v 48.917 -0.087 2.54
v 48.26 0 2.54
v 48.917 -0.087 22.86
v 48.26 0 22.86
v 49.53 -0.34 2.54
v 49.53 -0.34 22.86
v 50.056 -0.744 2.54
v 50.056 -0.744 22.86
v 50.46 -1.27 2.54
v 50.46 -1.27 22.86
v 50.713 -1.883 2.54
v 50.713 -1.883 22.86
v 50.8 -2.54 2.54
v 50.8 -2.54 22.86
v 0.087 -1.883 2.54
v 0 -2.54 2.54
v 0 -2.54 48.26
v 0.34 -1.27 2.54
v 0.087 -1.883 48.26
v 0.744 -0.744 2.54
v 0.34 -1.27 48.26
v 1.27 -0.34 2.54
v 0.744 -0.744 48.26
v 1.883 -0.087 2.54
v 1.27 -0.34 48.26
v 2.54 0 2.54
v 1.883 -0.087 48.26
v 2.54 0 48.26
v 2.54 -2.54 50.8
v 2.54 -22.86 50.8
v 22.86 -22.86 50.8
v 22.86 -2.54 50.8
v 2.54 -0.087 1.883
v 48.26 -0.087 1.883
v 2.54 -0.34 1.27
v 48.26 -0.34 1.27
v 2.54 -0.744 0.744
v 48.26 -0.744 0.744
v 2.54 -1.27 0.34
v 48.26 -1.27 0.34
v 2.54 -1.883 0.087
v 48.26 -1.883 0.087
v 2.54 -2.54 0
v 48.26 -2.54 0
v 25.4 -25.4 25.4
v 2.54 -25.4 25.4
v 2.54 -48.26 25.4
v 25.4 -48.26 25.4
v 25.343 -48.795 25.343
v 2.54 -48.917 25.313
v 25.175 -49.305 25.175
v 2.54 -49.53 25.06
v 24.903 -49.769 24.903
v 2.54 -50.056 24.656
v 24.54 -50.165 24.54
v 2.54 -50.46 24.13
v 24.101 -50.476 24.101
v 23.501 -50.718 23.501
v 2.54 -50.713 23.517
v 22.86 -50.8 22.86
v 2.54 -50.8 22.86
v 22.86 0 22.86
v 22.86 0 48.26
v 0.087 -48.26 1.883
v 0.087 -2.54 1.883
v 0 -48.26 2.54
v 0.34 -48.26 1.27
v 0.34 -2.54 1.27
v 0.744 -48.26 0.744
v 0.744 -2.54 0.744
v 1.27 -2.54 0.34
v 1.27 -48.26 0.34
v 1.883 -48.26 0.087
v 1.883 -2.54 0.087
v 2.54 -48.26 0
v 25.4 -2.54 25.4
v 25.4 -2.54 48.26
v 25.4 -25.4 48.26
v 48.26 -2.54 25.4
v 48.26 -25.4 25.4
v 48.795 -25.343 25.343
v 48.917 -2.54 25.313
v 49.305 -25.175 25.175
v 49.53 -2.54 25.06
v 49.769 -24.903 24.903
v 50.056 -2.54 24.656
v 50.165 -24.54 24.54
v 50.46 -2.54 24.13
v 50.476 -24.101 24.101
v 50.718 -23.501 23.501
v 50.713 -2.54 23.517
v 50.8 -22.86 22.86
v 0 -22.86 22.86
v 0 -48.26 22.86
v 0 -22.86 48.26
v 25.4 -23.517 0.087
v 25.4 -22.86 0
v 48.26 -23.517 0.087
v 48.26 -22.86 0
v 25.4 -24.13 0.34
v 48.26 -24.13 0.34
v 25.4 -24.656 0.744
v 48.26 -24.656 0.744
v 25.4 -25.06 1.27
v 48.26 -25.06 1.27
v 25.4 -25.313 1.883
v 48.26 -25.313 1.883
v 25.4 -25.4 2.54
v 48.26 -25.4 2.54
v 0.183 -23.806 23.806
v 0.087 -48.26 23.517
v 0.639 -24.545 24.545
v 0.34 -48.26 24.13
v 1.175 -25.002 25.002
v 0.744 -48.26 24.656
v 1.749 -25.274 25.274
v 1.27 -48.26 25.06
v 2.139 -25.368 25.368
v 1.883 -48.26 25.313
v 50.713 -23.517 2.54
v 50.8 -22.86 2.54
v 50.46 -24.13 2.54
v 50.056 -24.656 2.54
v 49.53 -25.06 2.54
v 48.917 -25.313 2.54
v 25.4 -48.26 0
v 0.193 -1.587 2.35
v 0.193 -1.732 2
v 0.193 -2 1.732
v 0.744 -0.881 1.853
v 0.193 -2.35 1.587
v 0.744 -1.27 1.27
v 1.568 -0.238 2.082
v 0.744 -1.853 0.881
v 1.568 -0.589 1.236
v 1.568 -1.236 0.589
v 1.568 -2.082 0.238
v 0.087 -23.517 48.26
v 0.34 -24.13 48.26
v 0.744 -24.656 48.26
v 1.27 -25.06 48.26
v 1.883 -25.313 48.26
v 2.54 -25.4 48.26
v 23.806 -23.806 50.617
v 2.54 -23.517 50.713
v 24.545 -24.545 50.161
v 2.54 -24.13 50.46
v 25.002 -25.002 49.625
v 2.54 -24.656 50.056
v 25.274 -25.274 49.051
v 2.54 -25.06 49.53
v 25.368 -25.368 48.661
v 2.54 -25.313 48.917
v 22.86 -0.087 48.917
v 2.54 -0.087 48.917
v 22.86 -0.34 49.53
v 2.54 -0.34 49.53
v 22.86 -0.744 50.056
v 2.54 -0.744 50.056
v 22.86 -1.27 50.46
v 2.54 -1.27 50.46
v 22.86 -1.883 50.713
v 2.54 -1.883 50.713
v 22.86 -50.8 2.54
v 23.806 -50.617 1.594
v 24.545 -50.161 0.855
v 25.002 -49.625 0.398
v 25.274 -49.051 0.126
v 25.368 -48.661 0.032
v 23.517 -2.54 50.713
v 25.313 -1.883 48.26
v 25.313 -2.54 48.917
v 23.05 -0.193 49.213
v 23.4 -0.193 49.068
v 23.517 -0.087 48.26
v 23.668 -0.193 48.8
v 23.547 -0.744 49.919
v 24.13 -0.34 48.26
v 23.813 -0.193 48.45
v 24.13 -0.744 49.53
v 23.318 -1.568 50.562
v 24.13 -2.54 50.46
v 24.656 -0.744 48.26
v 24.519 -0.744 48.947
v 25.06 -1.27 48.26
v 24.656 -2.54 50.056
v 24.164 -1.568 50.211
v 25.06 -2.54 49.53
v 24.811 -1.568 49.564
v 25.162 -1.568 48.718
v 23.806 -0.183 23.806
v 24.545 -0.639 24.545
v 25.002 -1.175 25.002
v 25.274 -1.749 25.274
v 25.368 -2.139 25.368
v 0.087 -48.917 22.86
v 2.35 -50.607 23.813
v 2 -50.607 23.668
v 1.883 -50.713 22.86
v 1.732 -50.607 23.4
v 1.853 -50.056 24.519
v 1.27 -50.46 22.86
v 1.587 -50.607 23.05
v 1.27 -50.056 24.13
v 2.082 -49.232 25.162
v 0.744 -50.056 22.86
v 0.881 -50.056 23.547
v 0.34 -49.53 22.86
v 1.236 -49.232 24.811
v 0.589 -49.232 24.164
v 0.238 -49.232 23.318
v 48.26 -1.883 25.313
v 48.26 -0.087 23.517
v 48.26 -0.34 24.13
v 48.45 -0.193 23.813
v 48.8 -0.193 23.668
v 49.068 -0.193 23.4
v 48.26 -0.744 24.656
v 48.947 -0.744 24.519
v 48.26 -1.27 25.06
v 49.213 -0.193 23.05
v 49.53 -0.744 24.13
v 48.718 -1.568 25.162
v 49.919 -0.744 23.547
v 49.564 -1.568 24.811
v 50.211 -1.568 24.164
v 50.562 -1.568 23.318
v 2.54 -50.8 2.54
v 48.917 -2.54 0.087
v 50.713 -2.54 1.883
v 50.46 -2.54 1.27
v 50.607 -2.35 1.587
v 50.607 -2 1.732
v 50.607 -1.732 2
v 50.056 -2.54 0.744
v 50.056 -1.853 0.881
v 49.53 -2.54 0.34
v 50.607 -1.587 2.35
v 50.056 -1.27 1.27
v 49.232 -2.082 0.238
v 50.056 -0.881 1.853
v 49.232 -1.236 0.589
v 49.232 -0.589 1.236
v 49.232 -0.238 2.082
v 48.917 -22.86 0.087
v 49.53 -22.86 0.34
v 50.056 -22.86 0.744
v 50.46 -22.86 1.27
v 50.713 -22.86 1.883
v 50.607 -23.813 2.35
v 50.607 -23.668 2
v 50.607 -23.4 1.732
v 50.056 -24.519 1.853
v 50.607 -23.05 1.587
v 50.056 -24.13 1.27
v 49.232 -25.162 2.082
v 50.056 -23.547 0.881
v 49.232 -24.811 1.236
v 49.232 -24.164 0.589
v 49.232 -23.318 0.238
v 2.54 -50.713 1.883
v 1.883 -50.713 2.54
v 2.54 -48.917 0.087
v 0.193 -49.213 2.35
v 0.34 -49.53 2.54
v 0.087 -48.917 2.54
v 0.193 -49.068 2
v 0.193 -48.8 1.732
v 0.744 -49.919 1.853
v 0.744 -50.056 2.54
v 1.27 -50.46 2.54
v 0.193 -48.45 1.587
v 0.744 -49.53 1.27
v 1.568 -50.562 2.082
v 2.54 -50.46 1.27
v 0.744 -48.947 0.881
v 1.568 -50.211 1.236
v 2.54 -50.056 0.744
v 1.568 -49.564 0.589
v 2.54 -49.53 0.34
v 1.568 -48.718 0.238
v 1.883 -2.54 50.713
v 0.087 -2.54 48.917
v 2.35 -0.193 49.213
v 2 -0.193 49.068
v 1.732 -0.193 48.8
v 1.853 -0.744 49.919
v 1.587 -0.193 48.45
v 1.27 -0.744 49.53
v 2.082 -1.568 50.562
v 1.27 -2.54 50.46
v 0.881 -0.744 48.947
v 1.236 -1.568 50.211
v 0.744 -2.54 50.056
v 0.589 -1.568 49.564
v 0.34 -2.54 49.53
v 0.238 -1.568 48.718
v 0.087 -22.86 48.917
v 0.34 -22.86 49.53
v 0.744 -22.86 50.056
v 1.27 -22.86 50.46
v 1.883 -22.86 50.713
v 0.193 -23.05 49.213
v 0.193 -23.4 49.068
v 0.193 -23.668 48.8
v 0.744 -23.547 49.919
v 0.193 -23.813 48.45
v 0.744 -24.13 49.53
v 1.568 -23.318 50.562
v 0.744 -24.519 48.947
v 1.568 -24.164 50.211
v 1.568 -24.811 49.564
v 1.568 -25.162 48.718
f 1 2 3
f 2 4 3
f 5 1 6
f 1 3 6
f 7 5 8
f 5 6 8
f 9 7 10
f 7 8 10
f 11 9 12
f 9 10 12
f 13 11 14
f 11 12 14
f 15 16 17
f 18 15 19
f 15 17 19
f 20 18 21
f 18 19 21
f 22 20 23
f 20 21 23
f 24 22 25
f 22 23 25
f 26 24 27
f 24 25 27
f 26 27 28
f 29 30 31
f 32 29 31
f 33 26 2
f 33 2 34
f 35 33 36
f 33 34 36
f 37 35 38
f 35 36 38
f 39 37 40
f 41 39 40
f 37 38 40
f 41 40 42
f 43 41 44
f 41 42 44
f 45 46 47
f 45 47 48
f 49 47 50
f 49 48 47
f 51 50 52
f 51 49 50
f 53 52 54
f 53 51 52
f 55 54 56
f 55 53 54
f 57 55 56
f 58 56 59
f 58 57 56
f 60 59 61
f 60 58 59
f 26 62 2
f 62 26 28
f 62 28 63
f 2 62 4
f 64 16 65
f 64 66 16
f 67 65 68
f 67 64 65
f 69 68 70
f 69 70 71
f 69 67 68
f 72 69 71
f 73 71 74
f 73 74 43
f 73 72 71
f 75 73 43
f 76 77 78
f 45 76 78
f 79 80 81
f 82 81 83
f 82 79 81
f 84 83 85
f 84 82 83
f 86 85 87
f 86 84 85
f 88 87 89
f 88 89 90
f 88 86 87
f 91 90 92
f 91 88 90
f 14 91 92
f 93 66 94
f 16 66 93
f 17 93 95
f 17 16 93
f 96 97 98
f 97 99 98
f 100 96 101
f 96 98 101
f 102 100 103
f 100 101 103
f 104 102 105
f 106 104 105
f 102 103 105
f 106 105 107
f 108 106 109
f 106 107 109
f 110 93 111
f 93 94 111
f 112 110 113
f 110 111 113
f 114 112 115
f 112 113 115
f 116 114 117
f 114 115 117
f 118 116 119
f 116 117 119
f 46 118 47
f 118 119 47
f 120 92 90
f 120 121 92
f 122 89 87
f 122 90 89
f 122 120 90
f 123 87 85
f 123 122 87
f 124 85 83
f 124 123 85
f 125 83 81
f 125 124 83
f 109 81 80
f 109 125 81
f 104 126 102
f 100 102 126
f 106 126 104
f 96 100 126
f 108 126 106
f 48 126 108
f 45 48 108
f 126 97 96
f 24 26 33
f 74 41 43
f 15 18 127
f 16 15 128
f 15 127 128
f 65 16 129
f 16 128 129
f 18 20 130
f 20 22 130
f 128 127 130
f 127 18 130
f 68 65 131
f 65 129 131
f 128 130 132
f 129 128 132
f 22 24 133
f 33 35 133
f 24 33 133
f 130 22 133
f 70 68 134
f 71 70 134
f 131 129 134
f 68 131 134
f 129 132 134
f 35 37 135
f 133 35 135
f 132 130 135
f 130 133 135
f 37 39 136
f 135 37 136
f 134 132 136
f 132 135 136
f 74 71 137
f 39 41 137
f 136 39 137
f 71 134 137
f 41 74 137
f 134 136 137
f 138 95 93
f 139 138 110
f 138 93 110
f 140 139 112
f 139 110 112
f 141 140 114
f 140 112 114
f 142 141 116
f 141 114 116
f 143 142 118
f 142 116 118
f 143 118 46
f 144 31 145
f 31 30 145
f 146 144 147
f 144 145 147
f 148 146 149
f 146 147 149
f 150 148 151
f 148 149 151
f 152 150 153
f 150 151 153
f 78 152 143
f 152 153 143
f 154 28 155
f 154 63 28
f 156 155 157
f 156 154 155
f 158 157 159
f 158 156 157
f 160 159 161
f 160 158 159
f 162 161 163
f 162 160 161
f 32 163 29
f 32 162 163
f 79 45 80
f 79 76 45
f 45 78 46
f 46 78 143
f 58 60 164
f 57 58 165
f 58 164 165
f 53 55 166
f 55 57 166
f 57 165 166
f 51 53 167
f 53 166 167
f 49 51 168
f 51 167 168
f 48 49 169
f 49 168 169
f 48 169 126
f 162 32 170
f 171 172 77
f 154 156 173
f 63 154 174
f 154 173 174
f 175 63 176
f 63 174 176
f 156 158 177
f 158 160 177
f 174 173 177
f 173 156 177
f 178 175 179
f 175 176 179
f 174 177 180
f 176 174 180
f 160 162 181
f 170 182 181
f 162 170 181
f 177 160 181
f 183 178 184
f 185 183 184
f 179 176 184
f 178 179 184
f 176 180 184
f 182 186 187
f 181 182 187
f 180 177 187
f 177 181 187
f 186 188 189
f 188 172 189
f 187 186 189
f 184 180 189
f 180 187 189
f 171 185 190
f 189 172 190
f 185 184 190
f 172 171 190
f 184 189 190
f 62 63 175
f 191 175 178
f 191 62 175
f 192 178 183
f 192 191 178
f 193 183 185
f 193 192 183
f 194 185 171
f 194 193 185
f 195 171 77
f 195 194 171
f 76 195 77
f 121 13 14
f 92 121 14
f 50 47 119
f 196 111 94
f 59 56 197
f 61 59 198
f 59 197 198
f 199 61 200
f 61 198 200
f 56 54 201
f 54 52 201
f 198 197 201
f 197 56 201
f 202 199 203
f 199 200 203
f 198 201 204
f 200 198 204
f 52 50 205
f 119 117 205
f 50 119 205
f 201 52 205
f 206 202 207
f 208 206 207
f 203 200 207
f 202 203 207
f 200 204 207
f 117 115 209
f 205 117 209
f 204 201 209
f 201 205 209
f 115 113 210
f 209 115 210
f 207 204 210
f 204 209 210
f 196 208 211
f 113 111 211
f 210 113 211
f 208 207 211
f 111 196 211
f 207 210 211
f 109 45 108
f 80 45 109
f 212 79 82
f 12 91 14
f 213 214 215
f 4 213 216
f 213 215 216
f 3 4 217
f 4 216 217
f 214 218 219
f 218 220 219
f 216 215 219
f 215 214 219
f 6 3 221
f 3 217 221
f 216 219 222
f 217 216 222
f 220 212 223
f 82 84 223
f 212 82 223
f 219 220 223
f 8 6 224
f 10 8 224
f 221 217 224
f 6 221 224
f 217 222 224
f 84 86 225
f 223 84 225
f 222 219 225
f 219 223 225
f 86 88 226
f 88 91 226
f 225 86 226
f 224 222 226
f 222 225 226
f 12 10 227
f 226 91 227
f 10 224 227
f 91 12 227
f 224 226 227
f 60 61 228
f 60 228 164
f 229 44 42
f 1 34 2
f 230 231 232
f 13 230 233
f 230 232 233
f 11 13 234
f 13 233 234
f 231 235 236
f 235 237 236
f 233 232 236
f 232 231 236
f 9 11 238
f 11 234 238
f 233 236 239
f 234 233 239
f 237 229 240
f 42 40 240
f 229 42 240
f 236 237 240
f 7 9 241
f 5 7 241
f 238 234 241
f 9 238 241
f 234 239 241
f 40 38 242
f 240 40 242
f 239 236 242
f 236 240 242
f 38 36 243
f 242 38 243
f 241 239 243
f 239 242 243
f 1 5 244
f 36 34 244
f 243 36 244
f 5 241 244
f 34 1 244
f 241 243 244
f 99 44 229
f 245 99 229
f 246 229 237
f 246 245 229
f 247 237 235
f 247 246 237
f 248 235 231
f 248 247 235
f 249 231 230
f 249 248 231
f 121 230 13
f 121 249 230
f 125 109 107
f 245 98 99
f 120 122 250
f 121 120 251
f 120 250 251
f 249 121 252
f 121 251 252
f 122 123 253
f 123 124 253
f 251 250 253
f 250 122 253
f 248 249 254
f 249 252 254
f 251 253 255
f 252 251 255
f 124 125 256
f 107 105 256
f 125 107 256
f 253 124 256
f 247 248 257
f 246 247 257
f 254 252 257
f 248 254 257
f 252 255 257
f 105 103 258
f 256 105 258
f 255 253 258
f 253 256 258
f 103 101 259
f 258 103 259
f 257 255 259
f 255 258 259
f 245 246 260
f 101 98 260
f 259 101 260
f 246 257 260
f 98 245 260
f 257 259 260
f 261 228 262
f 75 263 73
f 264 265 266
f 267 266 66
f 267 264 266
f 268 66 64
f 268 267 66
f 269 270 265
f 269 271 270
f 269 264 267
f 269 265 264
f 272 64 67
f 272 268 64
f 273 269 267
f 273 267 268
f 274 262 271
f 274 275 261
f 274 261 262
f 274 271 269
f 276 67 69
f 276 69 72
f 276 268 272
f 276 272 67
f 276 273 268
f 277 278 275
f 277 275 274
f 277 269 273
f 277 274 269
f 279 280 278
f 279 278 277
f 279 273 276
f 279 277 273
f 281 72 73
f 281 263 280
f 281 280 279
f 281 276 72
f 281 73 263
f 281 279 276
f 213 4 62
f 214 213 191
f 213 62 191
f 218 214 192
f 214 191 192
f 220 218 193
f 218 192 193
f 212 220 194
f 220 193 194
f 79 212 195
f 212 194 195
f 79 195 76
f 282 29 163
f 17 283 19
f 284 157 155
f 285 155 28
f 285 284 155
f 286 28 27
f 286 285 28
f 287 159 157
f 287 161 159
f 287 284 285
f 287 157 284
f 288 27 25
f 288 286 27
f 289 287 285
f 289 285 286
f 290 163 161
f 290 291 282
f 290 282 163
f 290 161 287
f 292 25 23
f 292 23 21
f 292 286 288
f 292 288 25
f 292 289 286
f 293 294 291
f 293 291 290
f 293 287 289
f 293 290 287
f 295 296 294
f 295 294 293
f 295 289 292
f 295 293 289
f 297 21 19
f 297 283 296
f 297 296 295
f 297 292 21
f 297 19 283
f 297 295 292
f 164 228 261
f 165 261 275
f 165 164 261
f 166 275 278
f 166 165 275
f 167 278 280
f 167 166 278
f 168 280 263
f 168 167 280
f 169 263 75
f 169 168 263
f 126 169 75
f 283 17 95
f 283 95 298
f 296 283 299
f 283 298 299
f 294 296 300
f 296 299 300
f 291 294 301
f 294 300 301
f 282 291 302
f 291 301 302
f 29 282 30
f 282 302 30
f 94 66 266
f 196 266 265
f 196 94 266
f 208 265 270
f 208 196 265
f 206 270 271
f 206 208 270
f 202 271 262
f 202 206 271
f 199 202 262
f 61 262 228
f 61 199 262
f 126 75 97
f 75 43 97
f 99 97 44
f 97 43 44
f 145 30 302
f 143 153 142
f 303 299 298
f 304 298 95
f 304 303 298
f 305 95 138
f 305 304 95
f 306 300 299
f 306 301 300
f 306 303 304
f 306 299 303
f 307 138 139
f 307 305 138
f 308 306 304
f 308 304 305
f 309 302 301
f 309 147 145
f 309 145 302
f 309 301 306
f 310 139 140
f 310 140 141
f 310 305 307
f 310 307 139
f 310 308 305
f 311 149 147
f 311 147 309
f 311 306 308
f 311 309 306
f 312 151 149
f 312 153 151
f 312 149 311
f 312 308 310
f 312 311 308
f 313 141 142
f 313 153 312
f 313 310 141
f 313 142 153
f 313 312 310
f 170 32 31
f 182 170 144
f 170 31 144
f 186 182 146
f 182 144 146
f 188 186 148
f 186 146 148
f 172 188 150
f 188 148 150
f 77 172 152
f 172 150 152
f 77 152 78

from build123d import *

# Parameters (mm, degrees)
F0_W     = 50.8
F0_H     = 50.8
F1_DEPTH = 50.8
F3_DEPTH = 25.4
F4_W     = 25.4
F4_H     = 25.4
F5_DEPTH = 25.4
F6_R     = 2.54


with BuildPart() as f1:
    # F0 (on Front) → F1 (new body)
    with BuildSketch(Plane.XZ):
        with Locations((25.4, 25.4)):
            Rectangle(F0_W, F0_H)
    extrude(amount=F1_DEPTH)

    # F2 (on face) → F3 (cut)
    with BuildSketch(Plane.XY.offset(50.8)):
        Polygon((50.8, 0), (25.4, 0), (25.4, -25.4), (0, -25.4), (0, -50.8), (50.8, -50.8), align=None)
    extrude(amount=-F3_DEPTH, mode=Mode.SUBTRACT)

    # F4 (on face) → F5 (cut)
    with BuildSketch(Plane.XY.offset(25.4)):
        with Locations((38.1, -38.1)):
            Rectangle(F4_W, F4_H)
    extrude(amount=-F5_DEPTH, mode=Mode.SUBTRACT)

    # F6
    f6_edges = [f1.edges().sort_by_distance(p)[0] for p in [
        (50.8, -12.7, 25.4),
        (0, -38.1, 25.4),
        (25.4, -12.7, 50.8),
        (12.7, -25.4, 50.8),
        (0, -12.7, 50.8),
        (12.7, 0, 50.8),
        (38.1, 0, 25.4),
        (25.4, 0, 38.1),
        (12.7, -50.8, 25.4),
        (12.7, -50.8, 0),
        (38.1, -25.4, 0),
        (50.8, -25.4, 12.7),
        (25.4, -50.8, 12.7),
        (0, -50.8, 12.7),
        (25.4, 0, 0),
        (50.8, -12.7, 0),
        (0, 0, 25.4),
        (0, -25.4, 0),
        (50.8, 0, 12.7),
        (0, -25.4, 38.1),
    ]]
    fillet(f6_edges, radius=F6_R)


solid = f1.part
